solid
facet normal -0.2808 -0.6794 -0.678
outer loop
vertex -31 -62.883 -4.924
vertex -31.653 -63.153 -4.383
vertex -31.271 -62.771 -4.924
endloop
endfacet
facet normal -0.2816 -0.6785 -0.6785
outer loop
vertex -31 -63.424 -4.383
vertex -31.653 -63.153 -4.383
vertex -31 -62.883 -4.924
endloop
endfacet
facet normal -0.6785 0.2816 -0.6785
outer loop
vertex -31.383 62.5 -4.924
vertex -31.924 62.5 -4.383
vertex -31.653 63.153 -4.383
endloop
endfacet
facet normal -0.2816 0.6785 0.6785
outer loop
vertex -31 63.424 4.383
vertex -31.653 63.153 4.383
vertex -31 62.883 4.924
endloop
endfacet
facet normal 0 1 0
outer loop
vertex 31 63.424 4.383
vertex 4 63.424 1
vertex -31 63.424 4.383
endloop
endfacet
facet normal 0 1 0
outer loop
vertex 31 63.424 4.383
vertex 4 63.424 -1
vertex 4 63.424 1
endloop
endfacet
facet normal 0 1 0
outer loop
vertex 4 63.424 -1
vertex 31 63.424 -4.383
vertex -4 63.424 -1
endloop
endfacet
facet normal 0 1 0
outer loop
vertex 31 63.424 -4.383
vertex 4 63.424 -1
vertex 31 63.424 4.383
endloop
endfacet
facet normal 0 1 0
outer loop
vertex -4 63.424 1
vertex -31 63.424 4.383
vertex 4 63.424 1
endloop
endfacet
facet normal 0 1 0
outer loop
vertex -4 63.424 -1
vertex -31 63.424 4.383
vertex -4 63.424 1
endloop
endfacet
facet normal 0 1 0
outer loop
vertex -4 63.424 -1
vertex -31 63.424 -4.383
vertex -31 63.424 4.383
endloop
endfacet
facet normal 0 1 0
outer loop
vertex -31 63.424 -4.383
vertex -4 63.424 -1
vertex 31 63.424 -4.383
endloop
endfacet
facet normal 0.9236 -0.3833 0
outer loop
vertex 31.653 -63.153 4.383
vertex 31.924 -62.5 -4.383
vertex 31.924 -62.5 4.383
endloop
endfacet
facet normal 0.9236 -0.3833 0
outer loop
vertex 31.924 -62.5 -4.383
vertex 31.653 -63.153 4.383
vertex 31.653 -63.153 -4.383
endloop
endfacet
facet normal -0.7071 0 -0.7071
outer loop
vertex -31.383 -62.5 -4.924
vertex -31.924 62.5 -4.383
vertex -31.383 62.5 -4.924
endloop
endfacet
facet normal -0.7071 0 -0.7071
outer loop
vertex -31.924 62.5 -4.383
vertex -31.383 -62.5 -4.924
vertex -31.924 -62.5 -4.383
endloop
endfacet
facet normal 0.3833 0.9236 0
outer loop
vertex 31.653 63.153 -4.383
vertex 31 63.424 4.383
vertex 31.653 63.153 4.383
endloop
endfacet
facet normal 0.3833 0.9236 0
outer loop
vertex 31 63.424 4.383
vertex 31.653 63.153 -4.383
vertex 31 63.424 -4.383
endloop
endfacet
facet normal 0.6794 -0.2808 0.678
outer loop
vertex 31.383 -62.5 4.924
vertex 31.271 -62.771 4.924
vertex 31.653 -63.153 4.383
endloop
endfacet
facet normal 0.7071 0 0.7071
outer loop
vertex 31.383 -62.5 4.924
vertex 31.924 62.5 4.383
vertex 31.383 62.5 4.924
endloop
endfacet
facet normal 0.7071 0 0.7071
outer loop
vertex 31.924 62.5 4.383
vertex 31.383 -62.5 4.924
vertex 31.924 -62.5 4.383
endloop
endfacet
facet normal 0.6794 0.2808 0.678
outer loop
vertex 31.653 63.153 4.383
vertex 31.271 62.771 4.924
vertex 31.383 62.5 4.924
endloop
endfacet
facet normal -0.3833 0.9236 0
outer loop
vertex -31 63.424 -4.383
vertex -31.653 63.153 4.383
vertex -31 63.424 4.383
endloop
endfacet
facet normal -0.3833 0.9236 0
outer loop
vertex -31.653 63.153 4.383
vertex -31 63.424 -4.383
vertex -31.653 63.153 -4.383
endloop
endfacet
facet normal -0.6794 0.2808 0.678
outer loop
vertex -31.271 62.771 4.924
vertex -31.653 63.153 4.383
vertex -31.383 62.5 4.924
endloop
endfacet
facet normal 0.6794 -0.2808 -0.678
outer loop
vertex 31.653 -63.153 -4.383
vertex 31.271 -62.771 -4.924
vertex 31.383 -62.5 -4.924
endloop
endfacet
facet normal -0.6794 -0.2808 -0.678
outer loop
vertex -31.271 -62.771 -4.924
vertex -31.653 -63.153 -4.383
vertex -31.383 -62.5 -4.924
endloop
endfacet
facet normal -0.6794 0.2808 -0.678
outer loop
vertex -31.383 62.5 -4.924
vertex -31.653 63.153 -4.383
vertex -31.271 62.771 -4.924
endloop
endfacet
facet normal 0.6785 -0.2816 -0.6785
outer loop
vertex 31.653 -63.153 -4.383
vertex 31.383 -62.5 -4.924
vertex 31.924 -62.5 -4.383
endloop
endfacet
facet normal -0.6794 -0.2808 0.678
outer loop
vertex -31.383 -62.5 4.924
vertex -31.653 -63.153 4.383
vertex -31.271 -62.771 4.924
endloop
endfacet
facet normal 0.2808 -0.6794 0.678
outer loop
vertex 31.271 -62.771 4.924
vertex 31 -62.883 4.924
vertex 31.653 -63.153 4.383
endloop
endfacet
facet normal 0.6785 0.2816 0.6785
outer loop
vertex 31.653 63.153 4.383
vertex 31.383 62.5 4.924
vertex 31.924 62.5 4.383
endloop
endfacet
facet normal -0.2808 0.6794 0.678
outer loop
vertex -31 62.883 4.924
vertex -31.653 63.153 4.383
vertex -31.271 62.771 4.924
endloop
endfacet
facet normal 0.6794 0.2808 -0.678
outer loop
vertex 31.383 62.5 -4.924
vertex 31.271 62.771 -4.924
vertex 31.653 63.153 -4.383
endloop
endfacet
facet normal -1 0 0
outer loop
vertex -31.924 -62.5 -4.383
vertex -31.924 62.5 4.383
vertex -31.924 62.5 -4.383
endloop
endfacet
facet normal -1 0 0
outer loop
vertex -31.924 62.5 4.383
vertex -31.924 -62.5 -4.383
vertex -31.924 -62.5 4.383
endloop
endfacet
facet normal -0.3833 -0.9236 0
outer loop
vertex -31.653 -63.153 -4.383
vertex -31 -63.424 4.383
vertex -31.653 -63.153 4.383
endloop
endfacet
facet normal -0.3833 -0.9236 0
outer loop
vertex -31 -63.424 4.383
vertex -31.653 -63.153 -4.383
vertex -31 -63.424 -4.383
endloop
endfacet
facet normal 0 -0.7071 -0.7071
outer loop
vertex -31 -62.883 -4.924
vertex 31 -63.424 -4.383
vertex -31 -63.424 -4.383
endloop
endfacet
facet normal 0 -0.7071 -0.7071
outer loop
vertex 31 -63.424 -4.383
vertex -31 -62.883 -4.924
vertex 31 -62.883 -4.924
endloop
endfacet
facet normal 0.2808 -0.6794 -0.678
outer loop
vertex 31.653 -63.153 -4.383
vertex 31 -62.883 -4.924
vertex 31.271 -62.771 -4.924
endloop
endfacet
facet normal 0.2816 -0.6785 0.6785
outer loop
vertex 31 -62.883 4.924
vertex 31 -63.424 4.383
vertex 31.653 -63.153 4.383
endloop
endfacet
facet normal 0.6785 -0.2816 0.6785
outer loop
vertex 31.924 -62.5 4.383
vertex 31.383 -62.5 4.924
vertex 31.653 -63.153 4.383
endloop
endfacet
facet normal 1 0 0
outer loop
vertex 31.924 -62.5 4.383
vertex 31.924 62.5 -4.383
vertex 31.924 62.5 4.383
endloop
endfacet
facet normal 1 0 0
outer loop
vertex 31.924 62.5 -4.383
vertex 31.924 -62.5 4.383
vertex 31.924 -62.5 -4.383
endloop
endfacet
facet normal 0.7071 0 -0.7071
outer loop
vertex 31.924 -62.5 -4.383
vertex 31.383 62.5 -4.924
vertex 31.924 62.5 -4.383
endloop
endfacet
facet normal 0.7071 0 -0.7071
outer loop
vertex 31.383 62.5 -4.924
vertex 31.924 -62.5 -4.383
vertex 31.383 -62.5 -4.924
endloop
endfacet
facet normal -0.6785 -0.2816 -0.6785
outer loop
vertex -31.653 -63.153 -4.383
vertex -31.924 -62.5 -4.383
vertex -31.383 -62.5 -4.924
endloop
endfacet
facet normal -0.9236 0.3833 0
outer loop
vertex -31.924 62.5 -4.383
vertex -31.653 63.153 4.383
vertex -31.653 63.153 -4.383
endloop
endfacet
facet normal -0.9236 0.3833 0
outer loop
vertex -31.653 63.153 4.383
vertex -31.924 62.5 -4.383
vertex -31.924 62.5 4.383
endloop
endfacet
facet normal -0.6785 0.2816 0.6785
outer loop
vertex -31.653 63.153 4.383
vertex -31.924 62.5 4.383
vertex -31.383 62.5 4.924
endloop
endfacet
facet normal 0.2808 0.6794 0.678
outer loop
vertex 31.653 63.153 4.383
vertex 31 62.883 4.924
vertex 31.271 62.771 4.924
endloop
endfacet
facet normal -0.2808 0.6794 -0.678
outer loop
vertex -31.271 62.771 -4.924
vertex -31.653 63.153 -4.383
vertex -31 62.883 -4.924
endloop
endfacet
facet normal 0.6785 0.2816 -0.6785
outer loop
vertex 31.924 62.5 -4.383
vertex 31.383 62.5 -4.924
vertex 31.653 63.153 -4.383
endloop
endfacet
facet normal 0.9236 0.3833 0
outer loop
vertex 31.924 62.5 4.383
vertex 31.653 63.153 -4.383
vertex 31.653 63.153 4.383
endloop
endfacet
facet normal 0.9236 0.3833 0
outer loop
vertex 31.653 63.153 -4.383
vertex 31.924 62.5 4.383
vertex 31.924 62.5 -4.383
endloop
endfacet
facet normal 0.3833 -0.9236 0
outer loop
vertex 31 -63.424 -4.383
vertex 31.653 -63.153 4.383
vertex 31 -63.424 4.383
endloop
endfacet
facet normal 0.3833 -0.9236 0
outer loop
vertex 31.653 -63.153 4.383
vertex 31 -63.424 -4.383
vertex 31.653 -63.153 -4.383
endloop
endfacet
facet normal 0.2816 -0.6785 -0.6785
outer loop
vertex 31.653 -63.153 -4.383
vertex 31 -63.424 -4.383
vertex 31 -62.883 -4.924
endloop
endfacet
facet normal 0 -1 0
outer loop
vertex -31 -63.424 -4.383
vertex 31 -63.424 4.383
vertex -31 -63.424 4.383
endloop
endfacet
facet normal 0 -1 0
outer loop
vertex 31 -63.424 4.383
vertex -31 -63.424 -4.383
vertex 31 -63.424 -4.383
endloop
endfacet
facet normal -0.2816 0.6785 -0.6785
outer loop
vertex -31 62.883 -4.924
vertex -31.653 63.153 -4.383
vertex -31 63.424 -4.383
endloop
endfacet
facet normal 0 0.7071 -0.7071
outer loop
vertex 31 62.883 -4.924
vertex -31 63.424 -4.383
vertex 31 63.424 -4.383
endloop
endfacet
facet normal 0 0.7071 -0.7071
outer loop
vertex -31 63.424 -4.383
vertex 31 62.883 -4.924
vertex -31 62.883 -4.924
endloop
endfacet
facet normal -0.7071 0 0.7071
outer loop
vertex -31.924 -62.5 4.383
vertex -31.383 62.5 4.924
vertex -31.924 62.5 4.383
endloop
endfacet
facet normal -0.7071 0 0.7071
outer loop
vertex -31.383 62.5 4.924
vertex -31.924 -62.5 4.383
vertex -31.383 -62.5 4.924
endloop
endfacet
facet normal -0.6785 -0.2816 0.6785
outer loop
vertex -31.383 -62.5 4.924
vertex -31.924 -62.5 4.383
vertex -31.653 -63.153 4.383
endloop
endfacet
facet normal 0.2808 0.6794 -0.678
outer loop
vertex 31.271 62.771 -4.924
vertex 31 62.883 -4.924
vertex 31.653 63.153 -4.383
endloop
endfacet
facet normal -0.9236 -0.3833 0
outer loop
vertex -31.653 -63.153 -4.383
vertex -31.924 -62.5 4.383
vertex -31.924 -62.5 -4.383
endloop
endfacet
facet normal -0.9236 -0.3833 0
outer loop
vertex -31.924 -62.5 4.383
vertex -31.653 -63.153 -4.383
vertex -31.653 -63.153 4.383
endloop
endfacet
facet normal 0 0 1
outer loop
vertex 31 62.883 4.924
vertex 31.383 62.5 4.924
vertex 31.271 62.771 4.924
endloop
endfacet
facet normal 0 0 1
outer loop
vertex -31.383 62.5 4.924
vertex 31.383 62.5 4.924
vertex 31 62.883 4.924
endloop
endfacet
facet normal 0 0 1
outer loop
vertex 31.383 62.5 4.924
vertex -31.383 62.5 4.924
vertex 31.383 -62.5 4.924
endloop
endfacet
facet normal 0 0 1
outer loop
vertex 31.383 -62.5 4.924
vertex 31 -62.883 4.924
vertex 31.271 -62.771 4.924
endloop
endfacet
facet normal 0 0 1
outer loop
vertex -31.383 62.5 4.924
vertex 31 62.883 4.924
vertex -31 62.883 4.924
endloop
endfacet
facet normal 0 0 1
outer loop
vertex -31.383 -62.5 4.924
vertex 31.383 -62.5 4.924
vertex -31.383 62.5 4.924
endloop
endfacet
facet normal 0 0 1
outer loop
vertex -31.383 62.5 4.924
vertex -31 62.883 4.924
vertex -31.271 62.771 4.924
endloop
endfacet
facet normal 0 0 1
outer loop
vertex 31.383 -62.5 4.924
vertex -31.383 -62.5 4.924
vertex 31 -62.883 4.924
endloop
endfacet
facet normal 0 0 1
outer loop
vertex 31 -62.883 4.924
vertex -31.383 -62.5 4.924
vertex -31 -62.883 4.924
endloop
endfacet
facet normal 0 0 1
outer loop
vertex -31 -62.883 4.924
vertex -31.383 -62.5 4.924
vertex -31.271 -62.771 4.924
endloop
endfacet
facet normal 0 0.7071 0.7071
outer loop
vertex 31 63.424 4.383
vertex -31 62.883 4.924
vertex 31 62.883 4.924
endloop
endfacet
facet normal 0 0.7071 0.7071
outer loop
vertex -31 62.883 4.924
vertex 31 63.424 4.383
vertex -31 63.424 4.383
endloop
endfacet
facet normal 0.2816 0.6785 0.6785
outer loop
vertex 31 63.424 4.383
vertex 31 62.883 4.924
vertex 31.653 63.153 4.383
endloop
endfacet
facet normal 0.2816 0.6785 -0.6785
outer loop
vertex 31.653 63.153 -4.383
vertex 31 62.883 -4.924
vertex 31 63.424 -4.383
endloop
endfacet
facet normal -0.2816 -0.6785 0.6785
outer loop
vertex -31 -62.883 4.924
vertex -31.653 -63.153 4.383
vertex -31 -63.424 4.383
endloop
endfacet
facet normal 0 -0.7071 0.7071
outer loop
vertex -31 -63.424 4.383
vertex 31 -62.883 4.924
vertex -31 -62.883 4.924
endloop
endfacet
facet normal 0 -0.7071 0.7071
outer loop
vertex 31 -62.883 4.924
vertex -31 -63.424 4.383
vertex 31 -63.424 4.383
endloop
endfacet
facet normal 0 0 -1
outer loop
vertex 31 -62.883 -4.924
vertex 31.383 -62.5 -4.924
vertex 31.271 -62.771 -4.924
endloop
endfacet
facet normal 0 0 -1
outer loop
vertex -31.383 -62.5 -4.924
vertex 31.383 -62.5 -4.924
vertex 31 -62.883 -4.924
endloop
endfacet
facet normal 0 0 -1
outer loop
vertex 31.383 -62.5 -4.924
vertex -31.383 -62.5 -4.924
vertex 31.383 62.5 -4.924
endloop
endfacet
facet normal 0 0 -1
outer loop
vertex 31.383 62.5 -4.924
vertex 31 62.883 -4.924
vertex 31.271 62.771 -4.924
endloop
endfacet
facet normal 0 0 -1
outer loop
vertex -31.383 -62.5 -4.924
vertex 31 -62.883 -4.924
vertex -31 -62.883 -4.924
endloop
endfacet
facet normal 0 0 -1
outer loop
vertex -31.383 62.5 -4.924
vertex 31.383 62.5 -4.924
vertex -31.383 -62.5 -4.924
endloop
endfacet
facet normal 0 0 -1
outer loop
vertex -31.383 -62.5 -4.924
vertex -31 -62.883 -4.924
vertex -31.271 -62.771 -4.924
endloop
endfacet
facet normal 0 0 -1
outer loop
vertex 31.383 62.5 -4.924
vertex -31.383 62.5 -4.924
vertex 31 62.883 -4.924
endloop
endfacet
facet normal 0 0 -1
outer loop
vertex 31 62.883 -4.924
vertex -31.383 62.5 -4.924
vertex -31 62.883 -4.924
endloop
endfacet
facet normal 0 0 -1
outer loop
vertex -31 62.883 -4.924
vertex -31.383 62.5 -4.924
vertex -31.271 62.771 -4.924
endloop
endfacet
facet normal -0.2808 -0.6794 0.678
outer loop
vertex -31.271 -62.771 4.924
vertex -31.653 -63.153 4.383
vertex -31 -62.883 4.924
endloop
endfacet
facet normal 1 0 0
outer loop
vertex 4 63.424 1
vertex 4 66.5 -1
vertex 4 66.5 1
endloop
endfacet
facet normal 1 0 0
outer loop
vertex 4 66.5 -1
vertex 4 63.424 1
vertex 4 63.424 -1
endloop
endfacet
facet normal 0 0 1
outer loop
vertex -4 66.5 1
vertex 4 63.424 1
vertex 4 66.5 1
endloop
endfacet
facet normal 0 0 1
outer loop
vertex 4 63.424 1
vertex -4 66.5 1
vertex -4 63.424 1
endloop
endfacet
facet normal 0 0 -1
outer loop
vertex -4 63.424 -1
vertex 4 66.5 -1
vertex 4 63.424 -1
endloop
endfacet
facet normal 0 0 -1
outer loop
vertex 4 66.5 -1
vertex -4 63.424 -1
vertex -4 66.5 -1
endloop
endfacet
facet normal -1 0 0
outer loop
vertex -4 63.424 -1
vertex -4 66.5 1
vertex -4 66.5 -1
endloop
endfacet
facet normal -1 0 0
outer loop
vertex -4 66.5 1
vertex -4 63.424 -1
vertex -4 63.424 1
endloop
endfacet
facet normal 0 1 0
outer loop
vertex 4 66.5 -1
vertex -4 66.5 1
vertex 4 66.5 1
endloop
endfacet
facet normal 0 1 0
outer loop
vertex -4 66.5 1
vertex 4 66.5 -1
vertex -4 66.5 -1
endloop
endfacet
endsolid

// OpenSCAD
//phone
module phone()
{

	union(){
		color("silver") minkowski()
		{
			cube(size=[62,125,8], center=true);
			//cylinder(r=1,h=1);
			sphere(r=1,$fn=8);
		}
		
		//usb connector
		color("red")
		translate([0,62.5,0]){
			cube(size=[8,8,2],center=true);
		}
	}
};

module dock(deep){
	phone();	
};

dock(60);
